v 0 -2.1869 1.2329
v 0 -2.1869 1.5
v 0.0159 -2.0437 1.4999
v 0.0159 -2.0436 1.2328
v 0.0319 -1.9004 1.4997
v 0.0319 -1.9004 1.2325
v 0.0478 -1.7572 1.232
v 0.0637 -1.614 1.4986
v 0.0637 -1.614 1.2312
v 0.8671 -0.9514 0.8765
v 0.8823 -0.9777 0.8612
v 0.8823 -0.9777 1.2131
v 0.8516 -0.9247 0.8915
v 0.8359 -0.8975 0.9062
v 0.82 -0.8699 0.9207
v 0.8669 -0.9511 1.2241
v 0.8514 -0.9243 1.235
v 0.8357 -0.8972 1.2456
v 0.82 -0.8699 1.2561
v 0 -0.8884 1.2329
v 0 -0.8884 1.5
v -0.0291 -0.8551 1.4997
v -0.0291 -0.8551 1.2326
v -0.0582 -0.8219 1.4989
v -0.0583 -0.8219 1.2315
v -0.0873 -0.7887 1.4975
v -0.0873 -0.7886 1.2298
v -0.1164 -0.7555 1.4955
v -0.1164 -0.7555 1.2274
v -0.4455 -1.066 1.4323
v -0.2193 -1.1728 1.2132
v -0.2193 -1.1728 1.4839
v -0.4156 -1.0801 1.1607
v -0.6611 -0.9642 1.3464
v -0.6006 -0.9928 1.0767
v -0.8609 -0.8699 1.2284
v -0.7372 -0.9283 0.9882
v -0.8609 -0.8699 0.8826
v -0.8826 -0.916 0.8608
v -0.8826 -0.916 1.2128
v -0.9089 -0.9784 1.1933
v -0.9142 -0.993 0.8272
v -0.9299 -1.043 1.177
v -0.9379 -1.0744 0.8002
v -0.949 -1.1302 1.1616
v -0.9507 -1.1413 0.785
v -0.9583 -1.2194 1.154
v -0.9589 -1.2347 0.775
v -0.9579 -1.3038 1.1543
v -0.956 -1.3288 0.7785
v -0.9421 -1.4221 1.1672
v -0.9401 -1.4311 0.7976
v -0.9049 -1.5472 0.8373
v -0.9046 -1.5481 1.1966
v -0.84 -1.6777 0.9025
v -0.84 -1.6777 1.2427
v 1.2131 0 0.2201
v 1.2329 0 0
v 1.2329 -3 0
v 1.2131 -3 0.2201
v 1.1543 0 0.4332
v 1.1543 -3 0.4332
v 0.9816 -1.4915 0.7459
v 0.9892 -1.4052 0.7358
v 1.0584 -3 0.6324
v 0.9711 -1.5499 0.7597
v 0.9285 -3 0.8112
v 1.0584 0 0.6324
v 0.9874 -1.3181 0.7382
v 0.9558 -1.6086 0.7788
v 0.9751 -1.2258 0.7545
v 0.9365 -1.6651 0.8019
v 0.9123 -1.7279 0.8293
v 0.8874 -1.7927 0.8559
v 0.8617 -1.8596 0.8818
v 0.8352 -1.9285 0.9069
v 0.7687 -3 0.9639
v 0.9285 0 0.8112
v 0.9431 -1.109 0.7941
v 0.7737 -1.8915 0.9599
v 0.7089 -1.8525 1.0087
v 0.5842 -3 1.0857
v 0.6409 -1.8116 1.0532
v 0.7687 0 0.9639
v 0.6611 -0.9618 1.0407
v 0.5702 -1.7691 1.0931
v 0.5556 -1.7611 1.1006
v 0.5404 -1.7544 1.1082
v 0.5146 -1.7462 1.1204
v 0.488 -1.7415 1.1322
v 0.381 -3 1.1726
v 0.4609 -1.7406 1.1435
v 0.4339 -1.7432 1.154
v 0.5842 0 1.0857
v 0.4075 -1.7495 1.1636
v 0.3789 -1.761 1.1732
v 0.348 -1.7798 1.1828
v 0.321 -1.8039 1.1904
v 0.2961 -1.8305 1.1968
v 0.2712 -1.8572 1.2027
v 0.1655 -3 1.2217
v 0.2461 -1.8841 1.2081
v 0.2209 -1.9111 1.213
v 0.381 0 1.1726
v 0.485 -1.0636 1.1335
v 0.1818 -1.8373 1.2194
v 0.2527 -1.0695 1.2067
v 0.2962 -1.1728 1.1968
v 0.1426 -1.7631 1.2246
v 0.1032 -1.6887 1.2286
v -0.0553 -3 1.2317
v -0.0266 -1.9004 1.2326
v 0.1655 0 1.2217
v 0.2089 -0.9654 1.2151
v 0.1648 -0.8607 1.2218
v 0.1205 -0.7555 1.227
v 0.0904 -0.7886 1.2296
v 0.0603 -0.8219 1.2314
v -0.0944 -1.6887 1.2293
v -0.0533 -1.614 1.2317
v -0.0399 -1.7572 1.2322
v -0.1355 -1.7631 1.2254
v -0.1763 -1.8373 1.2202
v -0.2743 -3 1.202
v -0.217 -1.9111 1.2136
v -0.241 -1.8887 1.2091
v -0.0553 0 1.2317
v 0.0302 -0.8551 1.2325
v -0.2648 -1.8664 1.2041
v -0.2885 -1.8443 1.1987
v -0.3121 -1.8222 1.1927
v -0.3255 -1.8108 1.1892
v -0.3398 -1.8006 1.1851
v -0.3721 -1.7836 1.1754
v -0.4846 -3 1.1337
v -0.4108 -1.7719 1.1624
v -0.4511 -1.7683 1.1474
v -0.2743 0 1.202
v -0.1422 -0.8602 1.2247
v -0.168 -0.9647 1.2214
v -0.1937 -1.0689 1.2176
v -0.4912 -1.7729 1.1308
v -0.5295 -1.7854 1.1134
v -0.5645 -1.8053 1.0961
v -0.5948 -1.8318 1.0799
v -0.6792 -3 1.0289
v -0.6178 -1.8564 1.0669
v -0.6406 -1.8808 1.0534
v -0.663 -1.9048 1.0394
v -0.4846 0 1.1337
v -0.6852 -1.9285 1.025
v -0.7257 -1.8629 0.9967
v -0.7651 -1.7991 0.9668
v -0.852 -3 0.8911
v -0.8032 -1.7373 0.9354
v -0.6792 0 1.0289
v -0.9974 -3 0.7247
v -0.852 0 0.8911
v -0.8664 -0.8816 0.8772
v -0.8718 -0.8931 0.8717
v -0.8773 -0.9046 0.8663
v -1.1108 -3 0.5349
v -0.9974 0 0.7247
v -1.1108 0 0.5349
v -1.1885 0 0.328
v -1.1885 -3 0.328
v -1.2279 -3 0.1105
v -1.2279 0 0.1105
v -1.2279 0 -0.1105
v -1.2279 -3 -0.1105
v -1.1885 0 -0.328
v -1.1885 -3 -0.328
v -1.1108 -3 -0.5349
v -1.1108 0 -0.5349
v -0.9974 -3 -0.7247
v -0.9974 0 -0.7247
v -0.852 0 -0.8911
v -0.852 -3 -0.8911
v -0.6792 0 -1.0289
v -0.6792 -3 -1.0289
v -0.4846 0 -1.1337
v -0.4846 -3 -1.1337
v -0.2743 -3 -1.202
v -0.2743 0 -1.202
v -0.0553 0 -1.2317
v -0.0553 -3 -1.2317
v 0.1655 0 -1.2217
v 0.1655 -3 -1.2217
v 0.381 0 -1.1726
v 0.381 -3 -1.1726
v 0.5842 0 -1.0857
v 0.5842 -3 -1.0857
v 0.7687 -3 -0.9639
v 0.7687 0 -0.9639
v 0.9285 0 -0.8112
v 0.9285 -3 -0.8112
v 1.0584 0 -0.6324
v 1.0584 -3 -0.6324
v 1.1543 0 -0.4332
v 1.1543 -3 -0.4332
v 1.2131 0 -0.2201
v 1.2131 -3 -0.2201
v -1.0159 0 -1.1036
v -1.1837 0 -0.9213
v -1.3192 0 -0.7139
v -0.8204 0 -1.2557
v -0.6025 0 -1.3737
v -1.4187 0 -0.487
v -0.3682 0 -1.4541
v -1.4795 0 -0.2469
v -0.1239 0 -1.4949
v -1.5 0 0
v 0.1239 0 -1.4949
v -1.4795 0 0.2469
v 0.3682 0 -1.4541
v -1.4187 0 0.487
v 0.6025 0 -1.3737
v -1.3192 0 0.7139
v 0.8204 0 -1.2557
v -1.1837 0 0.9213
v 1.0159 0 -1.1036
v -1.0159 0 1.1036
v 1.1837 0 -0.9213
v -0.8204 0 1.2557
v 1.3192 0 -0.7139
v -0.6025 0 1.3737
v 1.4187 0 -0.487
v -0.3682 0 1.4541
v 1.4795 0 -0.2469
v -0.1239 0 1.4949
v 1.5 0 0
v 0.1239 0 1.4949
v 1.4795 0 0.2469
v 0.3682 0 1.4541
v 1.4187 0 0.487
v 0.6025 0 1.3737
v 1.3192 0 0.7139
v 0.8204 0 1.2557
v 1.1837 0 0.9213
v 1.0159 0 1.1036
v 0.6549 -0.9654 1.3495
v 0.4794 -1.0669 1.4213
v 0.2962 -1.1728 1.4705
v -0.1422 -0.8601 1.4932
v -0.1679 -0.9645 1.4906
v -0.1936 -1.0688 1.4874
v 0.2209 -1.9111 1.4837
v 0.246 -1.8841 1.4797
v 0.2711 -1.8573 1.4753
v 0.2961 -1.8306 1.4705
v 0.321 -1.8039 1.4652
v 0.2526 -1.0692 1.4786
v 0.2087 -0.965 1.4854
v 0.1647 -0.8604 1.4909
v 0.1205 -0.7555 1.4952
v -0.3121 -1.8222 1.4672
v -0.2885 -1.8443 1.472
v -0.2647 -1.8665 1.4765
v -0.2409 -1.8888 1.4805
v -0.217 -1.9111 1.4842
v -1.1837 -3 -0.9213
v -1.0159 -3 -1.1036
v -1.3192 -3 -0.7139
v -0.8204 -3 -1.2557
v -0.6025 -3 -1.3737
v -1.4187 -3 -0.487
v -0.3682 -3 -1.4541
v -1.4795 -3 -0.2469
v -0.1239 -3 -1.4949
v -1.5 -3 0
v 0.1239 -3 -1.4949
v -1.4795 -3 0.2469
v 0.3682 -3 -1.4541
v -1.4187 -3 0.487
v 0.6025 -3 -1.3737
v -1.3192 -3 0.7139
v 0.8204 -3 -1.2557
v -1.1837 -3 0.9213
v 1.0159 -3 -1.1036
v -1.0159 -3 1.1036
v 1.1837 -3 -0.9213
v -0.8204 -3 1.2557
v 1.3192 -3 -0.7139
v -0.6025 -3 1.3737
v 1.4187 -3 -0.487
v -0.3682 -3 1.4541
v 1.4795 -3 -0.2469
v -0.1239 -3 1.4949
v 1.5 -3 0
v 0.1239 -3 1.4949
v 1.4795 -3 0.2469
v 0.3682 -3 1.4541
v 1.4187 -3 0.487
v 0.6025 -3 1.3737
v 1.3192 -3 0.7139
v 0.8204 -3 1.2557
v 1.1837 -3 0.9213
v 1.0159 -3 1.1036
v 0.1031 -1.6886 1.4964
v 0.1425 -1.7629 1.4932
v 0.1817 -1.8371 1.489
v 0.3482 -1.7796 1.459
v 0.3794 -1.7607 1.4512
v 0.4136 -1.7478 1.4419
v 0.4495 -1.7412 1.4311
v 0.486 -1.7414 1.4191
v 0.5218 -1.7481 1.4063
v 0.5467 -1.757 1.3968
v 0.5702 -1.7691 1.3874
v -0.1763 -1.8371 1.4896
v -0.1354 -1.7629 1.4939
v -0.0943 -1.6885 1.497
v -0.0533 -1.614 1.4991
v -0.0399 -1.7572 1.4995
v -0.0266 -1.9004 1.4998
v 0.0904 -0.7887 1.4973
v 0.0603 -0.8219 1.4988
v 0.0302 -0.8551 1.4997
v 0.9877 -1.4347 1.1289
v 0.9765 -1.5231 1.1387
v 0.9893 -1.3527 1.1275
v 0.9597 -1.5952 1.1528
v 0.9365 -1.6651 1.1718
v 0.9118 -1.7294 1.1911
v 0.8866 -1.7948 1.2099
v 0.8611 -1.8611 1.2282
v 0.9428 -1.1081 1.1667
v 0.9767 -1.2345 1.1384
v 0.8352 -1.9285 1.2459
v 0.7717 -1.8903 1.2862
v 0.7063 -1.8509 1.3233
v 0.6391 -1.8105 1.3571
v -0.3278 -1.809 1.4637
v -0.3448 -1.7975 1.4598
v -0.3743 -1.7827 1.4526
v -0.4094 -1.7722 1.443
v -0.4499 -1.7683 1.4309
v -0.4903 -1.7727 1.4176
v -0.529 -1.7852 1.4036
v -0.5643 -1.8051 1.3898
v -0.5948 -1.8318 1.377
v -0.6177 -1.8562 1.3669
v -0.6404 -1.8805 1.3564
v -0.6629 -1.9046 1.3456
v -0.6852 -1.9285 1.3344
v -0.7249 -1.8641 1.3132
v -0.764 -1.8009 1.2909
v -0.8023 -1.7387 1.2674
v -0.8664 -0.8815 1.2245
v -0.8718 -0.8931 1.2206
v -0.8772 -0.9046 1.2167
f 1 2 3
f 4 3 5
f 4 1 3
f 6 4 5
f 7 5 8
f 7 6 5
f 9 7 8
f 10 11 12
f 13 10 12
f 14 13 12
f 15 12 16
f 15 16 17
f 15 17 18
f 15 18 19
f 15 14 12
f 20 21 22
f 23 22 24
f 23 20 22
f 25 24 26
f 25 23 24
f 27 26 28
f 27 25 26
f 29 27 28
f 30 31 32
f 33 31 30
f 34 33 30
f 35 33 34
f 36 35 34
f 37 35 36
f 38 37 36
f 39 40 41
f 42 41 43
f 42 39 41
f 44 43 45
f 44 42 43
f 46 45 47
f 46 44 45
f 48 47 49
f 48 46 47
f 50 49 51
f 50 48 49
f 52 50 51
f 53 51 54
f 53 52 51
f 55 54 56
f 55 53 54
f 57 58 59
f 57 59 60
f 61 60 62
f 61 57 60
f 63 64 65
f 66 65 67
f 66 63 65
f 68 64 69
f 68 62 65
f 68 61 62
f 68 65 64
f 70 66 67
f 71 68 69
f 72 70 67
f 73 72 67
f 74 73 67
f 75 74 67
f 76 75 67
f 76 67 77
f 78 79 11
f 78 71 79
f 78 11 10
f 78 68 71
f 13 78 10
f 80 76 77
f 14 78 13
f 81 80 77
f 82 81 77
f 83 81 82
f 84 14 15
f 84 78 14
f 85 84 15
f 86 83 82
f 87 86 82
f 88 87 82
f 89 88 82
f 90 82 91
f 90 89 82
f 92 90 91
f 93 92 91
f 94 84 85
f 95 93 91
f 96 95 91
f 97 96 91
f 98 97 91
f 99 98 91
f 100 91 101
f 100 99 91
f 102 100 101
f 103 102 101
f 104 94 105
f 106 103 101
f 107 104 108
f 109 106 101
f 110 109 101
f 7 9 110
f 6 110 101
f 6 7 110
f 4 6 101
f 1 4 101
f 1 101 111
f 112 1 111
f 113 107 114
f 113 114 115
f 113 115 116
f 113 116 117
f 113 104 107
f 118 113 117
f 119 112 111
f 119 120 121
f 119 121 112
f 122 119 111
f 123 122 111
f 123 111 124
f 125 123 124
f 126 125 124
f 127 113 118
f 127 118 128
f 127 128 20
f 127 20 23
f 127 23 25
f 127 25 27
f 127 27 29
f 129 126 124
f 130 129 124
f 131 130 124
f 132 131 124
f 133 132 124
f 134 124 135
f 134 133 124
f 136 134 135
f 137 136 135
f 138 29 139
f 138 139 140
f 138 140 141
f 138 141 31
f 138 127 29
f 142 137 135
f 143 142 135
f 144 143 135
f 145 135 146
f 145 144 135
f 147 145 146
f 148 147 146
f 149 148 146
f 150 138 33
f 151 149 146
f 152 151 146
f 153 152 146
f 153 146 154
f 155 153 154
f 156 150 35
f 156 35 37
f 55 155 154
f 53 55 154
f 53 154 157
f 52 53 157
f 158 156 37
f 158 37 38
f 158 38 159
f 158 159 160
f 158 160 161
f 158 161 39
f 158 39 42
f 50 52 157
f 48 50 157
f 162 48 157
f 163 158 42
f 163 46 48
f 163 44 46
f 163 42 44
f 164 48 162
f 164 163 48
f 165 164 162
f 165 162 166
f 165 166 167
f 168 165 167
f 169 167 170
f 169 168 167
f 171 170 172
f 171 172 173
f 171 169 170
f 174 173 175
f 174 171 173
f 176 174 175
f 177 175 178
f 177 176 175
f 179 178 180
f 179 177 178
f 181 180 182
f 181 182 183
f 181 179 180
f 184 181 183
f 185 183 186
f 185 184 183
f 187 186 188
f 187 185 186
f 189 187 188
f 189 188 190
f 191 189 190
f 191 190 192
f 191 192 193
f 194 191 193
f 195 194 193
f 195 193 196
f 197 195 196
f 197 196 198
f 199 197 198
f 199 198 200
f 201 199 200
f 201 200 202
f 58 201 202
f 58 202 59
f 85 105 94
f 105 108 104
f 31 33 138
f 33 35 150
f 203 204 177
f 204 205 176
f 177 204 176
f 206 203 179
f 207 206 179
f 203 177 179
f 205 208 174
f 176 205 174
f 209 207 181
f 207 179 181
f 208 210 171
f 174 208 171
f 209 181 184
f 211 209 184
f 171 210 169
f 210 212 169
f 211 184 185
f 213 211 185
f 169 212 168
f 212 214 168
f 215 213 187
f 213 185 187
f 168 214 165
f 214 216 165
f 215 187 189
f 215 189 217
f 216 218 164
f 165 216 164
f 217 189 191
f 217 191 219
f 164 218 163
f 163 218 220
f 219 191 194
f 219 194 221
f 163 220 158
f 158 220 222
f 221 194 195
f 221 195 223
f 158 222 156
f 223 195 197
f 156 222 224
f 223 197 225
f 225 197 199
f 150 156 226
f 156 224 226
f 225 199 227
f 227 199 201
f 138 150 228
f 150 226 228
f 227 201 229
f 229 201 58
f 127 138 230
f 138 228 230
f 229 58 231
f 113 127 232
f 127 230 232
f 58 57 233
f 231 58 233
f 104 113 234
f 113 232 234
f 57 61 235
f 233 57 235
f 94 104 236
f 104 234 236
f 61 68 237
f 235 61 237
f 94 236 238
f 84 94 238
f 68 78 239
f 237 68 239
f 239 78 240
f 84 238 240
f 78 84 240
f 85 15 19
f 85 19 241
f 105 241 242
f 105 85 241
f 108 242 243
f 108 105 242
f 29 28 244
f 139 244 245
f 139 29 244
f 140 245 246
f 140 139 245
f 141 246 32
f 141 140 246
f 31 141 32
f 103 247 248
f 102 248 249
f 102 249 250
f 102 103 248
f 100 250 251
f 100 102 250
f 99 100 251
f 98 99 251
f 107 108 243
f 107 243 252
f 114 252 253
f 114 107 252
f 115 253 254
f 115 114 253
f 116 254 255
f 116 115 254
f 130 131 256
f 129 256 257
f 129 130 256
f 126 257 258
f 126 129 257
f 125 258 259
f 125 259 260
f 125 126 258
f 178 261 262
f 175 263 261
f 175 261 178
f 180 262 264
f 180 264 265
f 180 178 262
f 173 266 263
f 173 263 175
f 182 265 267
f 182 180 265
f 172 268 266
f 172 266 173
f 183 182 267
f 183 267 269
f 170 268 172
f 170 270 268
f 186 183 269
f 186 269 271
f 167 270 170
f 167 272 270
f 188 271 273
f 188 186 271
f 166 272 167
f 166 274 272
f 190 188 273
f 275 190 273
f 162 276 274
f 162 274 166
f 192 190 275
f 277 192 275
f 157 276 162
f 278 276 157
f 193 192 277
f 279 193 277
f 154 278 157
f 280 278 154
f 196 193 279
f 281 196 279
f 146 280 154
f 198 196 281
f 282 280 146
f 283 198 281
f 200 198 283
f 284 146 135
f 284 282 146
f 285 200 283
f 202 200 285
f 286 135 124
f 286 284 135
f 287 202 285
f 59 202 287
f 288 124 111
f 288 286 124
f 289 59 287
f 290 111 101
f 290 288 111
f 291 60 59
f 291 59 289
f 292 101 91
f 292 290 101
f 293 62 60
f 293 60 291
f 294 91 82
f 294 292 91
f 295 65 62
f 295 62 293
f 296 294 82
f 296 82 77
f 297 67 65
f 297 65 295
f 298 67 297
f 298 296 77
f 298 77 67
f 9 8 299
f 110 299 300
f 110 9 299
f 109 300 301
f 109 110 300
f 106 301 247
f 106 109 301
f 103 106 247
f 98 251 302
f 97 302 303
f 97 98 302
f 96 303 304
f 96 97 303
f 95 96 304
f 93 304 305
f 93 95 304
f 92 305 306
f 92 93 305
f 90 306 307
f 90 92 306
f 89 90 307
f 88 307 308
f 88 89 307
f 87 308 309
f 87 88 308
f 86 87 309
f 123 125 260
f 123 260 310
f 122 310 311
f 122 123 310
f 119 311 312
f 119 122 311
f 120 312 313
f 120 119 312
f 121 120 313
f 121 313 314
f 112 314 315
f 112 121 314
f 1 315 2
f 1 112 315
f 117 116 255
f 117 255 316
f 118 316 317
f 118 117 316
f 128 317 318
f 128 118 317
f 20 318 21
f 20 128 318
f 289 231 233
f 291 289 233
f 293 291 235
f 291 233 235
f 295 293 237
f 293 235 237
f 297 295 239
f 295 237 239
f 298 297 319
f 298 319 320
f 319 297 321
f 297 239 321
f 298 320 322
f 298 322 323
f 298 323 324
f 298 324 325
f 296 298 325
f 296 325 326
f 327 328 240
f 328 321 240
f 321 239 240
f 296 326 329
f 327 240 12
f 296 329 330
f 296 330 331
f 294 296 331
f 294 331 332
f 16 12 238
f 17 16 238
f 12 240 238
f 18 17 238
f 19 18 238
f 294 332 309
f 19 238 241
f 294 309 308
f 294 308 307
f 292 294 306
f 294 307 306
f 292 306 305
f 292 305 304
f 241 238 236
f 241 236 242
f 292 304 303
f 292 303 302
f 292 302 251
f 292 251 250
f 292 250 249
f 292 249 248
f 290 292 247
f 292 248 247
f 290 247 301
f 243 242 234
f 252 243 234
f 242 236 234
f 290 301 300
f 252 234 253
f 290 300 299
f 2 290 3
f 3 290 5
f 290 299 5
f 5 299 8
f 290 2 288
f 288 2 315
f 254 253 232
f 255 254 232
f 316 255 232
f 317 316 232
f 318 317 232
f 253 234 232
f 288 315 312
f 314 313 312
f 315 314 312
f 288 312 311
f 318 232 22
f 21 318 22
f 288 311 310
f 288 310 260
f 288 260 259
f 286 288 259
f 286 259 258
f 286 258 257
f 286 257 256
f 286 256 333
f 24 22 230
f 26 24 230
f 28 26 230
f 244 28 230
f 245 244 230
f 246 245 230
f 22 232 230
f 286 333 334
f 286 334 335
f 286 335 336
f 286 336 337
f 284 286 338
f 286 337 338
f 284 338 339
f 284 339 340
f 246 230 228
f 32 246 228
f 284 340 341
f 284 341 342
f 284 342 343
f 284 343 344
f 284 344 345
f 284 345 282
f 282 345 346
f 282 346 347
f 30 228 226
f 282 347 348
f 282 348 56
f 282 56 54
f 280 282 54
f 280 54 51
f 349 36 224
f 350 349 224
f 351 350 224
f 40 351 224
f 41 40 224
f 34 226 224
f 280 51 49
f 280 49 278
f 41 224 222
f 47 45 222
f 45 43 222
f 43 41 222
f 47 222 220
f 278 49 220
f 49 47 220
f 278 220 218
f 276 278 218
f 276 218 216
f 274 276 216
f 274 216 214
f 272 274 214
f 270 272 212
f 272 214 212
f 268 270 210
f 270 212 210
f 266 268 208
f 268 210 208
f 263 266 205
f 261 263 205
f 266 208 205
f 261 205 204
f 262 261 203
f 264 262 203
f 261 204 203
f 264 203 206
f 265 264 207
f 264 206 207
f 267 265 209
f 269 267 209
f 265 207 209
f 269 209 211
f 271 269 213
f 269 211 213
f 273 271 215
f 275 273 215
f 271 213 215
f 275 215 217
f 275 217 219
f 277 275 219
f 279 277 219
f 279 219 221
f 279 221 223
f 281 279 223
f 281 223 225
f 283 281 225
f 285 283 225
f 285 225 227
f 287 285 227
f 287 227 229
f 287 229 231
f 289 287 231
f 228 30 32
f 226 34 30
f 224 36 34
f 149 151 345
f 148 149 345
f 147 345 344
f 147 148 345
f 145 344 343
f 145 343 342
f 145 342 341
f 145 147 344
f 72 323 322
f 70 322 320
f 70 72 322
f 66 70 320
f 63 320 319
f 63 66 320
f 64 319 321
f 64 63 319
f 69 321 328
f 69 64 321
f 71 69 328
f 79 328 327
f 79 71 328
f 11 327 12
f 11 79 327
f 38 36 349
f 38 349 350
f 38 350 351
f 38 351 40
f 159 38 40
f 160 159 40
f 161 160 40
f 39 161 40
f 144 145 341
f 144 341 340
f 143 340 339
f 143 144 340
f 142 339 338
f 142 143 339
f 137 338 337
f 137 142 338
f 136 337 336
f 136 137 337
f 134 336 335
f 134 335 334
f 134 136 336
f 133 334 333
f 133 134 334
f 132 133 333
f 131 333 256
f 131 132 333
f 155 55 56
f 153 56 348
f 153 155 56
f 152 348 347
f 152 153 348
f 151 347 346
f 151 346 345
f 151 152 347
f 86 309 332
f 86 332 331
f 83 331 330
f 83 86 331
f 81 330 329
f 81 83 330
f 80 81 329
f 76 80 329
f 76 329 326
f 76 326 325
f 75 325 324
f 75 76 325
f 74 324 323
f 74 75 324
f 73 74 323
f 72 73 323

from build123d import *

# Parameters (mm, degrees)
F0_R     = 1.5
F0_R_2   = 1.2328953581
F1_DEPTH = 3
F3_DEPTH = 1.5
F4_DEPTH = 25


with BuildPart() as f1:
    # F0 (on Front) → F1 (new body)
    with BuildSketch(Plane.XZ):
        Circle(F0_R)
        Circle(F0_R_2, mode=Mode.SUBTRACT)
    extrude(amount=F1_DEPTH)

    # F2 (on Top) → F3 (join)
    with BuildSketch(Plane.XY):
        with BuildLine():
            Line((-0.2170445457, -1.9110607387), (-0.0532556793, -1.6140477018))
            Line((-0.0532556793, -1.6140477018), (0, -2.1869295742))
            Line((0, -2.1869295742), (0.063720039, -1.6140477018))
            Line((0.063720039, -1.6140477018), (0.2208565566, -1.9110607387))
            Line((0.2208565566, -1.9110607387), (0.3210042121, -1.8039008222))
            ThreePointArc((0.3210042121, -1.8039008222), (0.4394470504, -1.7423849636), (0.5702157889, -1.769076607))
            Line((0.5702157889, -1.769076607), (0.8352482378, -1.9284979207))
            Line((0.8352482378, -1.9284979207), (0.9364700396, -1.665068496))
            ThreePointArc((0.9364700396, -1.665068496), (0.9872243455, -1.3152211188), (0.8822508219, -0.9776566862))
            Line((0.8822508219, -0.9776566862), (0.8199558369, -0.8699269849))
            Line((0.8199558369, -0.8699269849), (0.2961963428, -1.1727922988))
            Line((0.2961963428, -1.1727922988), (0.1204969513, -0.7554680719))
            Line((0.1204969513, -0.7554680719), (0, -0.8884153469))
            Line((0, -0.8884153469), (-0.1163881984, -0.7554680719))
            Line((-0.1163881984, -0.7554680719), (-0.219284062, -1.1727922988))
            Line((-0.219284062, -1.1727922988), (-0.8608880205, -0.8699269849))
            Line((-0.8608880205, -0.8699269849), (-0.8826491019, -0.9160266711))
            ThreePointArc((-0.8826491019, -0.9160266711), (-0.957948802, -1.3022589875), (-0.839994516, -1.6776684087))
            Line((-0.839994516, -1.6776684087), (-0.6851987564, -1.9284979207))
            Line((-0.6851987564, -1.9284979207), (-0.5948000148, -1.8317695295))
            ThreePointArc((-0.5948000148, -1.8317695295), (-0.4554398067, -1.7684434694), (-0.3121189719, -1.822207731))
            Line((-0.3121189719, -1.822207731), (-0.2170445457, -1.9110607387))
        make_face()
    extrude(amount=F3_DEPTH)

    # F4 (cut): a face of the model
    f4_faces = [f1.faces().sort_by_distance(p)[0] for p in [
        (0.0206453189, -1.3877719682, 0),
    ]]
    extrude(f4_faces, amount=-F4_DEPTH, mode=Mode.SUBTRACT)


solid = f1.part
